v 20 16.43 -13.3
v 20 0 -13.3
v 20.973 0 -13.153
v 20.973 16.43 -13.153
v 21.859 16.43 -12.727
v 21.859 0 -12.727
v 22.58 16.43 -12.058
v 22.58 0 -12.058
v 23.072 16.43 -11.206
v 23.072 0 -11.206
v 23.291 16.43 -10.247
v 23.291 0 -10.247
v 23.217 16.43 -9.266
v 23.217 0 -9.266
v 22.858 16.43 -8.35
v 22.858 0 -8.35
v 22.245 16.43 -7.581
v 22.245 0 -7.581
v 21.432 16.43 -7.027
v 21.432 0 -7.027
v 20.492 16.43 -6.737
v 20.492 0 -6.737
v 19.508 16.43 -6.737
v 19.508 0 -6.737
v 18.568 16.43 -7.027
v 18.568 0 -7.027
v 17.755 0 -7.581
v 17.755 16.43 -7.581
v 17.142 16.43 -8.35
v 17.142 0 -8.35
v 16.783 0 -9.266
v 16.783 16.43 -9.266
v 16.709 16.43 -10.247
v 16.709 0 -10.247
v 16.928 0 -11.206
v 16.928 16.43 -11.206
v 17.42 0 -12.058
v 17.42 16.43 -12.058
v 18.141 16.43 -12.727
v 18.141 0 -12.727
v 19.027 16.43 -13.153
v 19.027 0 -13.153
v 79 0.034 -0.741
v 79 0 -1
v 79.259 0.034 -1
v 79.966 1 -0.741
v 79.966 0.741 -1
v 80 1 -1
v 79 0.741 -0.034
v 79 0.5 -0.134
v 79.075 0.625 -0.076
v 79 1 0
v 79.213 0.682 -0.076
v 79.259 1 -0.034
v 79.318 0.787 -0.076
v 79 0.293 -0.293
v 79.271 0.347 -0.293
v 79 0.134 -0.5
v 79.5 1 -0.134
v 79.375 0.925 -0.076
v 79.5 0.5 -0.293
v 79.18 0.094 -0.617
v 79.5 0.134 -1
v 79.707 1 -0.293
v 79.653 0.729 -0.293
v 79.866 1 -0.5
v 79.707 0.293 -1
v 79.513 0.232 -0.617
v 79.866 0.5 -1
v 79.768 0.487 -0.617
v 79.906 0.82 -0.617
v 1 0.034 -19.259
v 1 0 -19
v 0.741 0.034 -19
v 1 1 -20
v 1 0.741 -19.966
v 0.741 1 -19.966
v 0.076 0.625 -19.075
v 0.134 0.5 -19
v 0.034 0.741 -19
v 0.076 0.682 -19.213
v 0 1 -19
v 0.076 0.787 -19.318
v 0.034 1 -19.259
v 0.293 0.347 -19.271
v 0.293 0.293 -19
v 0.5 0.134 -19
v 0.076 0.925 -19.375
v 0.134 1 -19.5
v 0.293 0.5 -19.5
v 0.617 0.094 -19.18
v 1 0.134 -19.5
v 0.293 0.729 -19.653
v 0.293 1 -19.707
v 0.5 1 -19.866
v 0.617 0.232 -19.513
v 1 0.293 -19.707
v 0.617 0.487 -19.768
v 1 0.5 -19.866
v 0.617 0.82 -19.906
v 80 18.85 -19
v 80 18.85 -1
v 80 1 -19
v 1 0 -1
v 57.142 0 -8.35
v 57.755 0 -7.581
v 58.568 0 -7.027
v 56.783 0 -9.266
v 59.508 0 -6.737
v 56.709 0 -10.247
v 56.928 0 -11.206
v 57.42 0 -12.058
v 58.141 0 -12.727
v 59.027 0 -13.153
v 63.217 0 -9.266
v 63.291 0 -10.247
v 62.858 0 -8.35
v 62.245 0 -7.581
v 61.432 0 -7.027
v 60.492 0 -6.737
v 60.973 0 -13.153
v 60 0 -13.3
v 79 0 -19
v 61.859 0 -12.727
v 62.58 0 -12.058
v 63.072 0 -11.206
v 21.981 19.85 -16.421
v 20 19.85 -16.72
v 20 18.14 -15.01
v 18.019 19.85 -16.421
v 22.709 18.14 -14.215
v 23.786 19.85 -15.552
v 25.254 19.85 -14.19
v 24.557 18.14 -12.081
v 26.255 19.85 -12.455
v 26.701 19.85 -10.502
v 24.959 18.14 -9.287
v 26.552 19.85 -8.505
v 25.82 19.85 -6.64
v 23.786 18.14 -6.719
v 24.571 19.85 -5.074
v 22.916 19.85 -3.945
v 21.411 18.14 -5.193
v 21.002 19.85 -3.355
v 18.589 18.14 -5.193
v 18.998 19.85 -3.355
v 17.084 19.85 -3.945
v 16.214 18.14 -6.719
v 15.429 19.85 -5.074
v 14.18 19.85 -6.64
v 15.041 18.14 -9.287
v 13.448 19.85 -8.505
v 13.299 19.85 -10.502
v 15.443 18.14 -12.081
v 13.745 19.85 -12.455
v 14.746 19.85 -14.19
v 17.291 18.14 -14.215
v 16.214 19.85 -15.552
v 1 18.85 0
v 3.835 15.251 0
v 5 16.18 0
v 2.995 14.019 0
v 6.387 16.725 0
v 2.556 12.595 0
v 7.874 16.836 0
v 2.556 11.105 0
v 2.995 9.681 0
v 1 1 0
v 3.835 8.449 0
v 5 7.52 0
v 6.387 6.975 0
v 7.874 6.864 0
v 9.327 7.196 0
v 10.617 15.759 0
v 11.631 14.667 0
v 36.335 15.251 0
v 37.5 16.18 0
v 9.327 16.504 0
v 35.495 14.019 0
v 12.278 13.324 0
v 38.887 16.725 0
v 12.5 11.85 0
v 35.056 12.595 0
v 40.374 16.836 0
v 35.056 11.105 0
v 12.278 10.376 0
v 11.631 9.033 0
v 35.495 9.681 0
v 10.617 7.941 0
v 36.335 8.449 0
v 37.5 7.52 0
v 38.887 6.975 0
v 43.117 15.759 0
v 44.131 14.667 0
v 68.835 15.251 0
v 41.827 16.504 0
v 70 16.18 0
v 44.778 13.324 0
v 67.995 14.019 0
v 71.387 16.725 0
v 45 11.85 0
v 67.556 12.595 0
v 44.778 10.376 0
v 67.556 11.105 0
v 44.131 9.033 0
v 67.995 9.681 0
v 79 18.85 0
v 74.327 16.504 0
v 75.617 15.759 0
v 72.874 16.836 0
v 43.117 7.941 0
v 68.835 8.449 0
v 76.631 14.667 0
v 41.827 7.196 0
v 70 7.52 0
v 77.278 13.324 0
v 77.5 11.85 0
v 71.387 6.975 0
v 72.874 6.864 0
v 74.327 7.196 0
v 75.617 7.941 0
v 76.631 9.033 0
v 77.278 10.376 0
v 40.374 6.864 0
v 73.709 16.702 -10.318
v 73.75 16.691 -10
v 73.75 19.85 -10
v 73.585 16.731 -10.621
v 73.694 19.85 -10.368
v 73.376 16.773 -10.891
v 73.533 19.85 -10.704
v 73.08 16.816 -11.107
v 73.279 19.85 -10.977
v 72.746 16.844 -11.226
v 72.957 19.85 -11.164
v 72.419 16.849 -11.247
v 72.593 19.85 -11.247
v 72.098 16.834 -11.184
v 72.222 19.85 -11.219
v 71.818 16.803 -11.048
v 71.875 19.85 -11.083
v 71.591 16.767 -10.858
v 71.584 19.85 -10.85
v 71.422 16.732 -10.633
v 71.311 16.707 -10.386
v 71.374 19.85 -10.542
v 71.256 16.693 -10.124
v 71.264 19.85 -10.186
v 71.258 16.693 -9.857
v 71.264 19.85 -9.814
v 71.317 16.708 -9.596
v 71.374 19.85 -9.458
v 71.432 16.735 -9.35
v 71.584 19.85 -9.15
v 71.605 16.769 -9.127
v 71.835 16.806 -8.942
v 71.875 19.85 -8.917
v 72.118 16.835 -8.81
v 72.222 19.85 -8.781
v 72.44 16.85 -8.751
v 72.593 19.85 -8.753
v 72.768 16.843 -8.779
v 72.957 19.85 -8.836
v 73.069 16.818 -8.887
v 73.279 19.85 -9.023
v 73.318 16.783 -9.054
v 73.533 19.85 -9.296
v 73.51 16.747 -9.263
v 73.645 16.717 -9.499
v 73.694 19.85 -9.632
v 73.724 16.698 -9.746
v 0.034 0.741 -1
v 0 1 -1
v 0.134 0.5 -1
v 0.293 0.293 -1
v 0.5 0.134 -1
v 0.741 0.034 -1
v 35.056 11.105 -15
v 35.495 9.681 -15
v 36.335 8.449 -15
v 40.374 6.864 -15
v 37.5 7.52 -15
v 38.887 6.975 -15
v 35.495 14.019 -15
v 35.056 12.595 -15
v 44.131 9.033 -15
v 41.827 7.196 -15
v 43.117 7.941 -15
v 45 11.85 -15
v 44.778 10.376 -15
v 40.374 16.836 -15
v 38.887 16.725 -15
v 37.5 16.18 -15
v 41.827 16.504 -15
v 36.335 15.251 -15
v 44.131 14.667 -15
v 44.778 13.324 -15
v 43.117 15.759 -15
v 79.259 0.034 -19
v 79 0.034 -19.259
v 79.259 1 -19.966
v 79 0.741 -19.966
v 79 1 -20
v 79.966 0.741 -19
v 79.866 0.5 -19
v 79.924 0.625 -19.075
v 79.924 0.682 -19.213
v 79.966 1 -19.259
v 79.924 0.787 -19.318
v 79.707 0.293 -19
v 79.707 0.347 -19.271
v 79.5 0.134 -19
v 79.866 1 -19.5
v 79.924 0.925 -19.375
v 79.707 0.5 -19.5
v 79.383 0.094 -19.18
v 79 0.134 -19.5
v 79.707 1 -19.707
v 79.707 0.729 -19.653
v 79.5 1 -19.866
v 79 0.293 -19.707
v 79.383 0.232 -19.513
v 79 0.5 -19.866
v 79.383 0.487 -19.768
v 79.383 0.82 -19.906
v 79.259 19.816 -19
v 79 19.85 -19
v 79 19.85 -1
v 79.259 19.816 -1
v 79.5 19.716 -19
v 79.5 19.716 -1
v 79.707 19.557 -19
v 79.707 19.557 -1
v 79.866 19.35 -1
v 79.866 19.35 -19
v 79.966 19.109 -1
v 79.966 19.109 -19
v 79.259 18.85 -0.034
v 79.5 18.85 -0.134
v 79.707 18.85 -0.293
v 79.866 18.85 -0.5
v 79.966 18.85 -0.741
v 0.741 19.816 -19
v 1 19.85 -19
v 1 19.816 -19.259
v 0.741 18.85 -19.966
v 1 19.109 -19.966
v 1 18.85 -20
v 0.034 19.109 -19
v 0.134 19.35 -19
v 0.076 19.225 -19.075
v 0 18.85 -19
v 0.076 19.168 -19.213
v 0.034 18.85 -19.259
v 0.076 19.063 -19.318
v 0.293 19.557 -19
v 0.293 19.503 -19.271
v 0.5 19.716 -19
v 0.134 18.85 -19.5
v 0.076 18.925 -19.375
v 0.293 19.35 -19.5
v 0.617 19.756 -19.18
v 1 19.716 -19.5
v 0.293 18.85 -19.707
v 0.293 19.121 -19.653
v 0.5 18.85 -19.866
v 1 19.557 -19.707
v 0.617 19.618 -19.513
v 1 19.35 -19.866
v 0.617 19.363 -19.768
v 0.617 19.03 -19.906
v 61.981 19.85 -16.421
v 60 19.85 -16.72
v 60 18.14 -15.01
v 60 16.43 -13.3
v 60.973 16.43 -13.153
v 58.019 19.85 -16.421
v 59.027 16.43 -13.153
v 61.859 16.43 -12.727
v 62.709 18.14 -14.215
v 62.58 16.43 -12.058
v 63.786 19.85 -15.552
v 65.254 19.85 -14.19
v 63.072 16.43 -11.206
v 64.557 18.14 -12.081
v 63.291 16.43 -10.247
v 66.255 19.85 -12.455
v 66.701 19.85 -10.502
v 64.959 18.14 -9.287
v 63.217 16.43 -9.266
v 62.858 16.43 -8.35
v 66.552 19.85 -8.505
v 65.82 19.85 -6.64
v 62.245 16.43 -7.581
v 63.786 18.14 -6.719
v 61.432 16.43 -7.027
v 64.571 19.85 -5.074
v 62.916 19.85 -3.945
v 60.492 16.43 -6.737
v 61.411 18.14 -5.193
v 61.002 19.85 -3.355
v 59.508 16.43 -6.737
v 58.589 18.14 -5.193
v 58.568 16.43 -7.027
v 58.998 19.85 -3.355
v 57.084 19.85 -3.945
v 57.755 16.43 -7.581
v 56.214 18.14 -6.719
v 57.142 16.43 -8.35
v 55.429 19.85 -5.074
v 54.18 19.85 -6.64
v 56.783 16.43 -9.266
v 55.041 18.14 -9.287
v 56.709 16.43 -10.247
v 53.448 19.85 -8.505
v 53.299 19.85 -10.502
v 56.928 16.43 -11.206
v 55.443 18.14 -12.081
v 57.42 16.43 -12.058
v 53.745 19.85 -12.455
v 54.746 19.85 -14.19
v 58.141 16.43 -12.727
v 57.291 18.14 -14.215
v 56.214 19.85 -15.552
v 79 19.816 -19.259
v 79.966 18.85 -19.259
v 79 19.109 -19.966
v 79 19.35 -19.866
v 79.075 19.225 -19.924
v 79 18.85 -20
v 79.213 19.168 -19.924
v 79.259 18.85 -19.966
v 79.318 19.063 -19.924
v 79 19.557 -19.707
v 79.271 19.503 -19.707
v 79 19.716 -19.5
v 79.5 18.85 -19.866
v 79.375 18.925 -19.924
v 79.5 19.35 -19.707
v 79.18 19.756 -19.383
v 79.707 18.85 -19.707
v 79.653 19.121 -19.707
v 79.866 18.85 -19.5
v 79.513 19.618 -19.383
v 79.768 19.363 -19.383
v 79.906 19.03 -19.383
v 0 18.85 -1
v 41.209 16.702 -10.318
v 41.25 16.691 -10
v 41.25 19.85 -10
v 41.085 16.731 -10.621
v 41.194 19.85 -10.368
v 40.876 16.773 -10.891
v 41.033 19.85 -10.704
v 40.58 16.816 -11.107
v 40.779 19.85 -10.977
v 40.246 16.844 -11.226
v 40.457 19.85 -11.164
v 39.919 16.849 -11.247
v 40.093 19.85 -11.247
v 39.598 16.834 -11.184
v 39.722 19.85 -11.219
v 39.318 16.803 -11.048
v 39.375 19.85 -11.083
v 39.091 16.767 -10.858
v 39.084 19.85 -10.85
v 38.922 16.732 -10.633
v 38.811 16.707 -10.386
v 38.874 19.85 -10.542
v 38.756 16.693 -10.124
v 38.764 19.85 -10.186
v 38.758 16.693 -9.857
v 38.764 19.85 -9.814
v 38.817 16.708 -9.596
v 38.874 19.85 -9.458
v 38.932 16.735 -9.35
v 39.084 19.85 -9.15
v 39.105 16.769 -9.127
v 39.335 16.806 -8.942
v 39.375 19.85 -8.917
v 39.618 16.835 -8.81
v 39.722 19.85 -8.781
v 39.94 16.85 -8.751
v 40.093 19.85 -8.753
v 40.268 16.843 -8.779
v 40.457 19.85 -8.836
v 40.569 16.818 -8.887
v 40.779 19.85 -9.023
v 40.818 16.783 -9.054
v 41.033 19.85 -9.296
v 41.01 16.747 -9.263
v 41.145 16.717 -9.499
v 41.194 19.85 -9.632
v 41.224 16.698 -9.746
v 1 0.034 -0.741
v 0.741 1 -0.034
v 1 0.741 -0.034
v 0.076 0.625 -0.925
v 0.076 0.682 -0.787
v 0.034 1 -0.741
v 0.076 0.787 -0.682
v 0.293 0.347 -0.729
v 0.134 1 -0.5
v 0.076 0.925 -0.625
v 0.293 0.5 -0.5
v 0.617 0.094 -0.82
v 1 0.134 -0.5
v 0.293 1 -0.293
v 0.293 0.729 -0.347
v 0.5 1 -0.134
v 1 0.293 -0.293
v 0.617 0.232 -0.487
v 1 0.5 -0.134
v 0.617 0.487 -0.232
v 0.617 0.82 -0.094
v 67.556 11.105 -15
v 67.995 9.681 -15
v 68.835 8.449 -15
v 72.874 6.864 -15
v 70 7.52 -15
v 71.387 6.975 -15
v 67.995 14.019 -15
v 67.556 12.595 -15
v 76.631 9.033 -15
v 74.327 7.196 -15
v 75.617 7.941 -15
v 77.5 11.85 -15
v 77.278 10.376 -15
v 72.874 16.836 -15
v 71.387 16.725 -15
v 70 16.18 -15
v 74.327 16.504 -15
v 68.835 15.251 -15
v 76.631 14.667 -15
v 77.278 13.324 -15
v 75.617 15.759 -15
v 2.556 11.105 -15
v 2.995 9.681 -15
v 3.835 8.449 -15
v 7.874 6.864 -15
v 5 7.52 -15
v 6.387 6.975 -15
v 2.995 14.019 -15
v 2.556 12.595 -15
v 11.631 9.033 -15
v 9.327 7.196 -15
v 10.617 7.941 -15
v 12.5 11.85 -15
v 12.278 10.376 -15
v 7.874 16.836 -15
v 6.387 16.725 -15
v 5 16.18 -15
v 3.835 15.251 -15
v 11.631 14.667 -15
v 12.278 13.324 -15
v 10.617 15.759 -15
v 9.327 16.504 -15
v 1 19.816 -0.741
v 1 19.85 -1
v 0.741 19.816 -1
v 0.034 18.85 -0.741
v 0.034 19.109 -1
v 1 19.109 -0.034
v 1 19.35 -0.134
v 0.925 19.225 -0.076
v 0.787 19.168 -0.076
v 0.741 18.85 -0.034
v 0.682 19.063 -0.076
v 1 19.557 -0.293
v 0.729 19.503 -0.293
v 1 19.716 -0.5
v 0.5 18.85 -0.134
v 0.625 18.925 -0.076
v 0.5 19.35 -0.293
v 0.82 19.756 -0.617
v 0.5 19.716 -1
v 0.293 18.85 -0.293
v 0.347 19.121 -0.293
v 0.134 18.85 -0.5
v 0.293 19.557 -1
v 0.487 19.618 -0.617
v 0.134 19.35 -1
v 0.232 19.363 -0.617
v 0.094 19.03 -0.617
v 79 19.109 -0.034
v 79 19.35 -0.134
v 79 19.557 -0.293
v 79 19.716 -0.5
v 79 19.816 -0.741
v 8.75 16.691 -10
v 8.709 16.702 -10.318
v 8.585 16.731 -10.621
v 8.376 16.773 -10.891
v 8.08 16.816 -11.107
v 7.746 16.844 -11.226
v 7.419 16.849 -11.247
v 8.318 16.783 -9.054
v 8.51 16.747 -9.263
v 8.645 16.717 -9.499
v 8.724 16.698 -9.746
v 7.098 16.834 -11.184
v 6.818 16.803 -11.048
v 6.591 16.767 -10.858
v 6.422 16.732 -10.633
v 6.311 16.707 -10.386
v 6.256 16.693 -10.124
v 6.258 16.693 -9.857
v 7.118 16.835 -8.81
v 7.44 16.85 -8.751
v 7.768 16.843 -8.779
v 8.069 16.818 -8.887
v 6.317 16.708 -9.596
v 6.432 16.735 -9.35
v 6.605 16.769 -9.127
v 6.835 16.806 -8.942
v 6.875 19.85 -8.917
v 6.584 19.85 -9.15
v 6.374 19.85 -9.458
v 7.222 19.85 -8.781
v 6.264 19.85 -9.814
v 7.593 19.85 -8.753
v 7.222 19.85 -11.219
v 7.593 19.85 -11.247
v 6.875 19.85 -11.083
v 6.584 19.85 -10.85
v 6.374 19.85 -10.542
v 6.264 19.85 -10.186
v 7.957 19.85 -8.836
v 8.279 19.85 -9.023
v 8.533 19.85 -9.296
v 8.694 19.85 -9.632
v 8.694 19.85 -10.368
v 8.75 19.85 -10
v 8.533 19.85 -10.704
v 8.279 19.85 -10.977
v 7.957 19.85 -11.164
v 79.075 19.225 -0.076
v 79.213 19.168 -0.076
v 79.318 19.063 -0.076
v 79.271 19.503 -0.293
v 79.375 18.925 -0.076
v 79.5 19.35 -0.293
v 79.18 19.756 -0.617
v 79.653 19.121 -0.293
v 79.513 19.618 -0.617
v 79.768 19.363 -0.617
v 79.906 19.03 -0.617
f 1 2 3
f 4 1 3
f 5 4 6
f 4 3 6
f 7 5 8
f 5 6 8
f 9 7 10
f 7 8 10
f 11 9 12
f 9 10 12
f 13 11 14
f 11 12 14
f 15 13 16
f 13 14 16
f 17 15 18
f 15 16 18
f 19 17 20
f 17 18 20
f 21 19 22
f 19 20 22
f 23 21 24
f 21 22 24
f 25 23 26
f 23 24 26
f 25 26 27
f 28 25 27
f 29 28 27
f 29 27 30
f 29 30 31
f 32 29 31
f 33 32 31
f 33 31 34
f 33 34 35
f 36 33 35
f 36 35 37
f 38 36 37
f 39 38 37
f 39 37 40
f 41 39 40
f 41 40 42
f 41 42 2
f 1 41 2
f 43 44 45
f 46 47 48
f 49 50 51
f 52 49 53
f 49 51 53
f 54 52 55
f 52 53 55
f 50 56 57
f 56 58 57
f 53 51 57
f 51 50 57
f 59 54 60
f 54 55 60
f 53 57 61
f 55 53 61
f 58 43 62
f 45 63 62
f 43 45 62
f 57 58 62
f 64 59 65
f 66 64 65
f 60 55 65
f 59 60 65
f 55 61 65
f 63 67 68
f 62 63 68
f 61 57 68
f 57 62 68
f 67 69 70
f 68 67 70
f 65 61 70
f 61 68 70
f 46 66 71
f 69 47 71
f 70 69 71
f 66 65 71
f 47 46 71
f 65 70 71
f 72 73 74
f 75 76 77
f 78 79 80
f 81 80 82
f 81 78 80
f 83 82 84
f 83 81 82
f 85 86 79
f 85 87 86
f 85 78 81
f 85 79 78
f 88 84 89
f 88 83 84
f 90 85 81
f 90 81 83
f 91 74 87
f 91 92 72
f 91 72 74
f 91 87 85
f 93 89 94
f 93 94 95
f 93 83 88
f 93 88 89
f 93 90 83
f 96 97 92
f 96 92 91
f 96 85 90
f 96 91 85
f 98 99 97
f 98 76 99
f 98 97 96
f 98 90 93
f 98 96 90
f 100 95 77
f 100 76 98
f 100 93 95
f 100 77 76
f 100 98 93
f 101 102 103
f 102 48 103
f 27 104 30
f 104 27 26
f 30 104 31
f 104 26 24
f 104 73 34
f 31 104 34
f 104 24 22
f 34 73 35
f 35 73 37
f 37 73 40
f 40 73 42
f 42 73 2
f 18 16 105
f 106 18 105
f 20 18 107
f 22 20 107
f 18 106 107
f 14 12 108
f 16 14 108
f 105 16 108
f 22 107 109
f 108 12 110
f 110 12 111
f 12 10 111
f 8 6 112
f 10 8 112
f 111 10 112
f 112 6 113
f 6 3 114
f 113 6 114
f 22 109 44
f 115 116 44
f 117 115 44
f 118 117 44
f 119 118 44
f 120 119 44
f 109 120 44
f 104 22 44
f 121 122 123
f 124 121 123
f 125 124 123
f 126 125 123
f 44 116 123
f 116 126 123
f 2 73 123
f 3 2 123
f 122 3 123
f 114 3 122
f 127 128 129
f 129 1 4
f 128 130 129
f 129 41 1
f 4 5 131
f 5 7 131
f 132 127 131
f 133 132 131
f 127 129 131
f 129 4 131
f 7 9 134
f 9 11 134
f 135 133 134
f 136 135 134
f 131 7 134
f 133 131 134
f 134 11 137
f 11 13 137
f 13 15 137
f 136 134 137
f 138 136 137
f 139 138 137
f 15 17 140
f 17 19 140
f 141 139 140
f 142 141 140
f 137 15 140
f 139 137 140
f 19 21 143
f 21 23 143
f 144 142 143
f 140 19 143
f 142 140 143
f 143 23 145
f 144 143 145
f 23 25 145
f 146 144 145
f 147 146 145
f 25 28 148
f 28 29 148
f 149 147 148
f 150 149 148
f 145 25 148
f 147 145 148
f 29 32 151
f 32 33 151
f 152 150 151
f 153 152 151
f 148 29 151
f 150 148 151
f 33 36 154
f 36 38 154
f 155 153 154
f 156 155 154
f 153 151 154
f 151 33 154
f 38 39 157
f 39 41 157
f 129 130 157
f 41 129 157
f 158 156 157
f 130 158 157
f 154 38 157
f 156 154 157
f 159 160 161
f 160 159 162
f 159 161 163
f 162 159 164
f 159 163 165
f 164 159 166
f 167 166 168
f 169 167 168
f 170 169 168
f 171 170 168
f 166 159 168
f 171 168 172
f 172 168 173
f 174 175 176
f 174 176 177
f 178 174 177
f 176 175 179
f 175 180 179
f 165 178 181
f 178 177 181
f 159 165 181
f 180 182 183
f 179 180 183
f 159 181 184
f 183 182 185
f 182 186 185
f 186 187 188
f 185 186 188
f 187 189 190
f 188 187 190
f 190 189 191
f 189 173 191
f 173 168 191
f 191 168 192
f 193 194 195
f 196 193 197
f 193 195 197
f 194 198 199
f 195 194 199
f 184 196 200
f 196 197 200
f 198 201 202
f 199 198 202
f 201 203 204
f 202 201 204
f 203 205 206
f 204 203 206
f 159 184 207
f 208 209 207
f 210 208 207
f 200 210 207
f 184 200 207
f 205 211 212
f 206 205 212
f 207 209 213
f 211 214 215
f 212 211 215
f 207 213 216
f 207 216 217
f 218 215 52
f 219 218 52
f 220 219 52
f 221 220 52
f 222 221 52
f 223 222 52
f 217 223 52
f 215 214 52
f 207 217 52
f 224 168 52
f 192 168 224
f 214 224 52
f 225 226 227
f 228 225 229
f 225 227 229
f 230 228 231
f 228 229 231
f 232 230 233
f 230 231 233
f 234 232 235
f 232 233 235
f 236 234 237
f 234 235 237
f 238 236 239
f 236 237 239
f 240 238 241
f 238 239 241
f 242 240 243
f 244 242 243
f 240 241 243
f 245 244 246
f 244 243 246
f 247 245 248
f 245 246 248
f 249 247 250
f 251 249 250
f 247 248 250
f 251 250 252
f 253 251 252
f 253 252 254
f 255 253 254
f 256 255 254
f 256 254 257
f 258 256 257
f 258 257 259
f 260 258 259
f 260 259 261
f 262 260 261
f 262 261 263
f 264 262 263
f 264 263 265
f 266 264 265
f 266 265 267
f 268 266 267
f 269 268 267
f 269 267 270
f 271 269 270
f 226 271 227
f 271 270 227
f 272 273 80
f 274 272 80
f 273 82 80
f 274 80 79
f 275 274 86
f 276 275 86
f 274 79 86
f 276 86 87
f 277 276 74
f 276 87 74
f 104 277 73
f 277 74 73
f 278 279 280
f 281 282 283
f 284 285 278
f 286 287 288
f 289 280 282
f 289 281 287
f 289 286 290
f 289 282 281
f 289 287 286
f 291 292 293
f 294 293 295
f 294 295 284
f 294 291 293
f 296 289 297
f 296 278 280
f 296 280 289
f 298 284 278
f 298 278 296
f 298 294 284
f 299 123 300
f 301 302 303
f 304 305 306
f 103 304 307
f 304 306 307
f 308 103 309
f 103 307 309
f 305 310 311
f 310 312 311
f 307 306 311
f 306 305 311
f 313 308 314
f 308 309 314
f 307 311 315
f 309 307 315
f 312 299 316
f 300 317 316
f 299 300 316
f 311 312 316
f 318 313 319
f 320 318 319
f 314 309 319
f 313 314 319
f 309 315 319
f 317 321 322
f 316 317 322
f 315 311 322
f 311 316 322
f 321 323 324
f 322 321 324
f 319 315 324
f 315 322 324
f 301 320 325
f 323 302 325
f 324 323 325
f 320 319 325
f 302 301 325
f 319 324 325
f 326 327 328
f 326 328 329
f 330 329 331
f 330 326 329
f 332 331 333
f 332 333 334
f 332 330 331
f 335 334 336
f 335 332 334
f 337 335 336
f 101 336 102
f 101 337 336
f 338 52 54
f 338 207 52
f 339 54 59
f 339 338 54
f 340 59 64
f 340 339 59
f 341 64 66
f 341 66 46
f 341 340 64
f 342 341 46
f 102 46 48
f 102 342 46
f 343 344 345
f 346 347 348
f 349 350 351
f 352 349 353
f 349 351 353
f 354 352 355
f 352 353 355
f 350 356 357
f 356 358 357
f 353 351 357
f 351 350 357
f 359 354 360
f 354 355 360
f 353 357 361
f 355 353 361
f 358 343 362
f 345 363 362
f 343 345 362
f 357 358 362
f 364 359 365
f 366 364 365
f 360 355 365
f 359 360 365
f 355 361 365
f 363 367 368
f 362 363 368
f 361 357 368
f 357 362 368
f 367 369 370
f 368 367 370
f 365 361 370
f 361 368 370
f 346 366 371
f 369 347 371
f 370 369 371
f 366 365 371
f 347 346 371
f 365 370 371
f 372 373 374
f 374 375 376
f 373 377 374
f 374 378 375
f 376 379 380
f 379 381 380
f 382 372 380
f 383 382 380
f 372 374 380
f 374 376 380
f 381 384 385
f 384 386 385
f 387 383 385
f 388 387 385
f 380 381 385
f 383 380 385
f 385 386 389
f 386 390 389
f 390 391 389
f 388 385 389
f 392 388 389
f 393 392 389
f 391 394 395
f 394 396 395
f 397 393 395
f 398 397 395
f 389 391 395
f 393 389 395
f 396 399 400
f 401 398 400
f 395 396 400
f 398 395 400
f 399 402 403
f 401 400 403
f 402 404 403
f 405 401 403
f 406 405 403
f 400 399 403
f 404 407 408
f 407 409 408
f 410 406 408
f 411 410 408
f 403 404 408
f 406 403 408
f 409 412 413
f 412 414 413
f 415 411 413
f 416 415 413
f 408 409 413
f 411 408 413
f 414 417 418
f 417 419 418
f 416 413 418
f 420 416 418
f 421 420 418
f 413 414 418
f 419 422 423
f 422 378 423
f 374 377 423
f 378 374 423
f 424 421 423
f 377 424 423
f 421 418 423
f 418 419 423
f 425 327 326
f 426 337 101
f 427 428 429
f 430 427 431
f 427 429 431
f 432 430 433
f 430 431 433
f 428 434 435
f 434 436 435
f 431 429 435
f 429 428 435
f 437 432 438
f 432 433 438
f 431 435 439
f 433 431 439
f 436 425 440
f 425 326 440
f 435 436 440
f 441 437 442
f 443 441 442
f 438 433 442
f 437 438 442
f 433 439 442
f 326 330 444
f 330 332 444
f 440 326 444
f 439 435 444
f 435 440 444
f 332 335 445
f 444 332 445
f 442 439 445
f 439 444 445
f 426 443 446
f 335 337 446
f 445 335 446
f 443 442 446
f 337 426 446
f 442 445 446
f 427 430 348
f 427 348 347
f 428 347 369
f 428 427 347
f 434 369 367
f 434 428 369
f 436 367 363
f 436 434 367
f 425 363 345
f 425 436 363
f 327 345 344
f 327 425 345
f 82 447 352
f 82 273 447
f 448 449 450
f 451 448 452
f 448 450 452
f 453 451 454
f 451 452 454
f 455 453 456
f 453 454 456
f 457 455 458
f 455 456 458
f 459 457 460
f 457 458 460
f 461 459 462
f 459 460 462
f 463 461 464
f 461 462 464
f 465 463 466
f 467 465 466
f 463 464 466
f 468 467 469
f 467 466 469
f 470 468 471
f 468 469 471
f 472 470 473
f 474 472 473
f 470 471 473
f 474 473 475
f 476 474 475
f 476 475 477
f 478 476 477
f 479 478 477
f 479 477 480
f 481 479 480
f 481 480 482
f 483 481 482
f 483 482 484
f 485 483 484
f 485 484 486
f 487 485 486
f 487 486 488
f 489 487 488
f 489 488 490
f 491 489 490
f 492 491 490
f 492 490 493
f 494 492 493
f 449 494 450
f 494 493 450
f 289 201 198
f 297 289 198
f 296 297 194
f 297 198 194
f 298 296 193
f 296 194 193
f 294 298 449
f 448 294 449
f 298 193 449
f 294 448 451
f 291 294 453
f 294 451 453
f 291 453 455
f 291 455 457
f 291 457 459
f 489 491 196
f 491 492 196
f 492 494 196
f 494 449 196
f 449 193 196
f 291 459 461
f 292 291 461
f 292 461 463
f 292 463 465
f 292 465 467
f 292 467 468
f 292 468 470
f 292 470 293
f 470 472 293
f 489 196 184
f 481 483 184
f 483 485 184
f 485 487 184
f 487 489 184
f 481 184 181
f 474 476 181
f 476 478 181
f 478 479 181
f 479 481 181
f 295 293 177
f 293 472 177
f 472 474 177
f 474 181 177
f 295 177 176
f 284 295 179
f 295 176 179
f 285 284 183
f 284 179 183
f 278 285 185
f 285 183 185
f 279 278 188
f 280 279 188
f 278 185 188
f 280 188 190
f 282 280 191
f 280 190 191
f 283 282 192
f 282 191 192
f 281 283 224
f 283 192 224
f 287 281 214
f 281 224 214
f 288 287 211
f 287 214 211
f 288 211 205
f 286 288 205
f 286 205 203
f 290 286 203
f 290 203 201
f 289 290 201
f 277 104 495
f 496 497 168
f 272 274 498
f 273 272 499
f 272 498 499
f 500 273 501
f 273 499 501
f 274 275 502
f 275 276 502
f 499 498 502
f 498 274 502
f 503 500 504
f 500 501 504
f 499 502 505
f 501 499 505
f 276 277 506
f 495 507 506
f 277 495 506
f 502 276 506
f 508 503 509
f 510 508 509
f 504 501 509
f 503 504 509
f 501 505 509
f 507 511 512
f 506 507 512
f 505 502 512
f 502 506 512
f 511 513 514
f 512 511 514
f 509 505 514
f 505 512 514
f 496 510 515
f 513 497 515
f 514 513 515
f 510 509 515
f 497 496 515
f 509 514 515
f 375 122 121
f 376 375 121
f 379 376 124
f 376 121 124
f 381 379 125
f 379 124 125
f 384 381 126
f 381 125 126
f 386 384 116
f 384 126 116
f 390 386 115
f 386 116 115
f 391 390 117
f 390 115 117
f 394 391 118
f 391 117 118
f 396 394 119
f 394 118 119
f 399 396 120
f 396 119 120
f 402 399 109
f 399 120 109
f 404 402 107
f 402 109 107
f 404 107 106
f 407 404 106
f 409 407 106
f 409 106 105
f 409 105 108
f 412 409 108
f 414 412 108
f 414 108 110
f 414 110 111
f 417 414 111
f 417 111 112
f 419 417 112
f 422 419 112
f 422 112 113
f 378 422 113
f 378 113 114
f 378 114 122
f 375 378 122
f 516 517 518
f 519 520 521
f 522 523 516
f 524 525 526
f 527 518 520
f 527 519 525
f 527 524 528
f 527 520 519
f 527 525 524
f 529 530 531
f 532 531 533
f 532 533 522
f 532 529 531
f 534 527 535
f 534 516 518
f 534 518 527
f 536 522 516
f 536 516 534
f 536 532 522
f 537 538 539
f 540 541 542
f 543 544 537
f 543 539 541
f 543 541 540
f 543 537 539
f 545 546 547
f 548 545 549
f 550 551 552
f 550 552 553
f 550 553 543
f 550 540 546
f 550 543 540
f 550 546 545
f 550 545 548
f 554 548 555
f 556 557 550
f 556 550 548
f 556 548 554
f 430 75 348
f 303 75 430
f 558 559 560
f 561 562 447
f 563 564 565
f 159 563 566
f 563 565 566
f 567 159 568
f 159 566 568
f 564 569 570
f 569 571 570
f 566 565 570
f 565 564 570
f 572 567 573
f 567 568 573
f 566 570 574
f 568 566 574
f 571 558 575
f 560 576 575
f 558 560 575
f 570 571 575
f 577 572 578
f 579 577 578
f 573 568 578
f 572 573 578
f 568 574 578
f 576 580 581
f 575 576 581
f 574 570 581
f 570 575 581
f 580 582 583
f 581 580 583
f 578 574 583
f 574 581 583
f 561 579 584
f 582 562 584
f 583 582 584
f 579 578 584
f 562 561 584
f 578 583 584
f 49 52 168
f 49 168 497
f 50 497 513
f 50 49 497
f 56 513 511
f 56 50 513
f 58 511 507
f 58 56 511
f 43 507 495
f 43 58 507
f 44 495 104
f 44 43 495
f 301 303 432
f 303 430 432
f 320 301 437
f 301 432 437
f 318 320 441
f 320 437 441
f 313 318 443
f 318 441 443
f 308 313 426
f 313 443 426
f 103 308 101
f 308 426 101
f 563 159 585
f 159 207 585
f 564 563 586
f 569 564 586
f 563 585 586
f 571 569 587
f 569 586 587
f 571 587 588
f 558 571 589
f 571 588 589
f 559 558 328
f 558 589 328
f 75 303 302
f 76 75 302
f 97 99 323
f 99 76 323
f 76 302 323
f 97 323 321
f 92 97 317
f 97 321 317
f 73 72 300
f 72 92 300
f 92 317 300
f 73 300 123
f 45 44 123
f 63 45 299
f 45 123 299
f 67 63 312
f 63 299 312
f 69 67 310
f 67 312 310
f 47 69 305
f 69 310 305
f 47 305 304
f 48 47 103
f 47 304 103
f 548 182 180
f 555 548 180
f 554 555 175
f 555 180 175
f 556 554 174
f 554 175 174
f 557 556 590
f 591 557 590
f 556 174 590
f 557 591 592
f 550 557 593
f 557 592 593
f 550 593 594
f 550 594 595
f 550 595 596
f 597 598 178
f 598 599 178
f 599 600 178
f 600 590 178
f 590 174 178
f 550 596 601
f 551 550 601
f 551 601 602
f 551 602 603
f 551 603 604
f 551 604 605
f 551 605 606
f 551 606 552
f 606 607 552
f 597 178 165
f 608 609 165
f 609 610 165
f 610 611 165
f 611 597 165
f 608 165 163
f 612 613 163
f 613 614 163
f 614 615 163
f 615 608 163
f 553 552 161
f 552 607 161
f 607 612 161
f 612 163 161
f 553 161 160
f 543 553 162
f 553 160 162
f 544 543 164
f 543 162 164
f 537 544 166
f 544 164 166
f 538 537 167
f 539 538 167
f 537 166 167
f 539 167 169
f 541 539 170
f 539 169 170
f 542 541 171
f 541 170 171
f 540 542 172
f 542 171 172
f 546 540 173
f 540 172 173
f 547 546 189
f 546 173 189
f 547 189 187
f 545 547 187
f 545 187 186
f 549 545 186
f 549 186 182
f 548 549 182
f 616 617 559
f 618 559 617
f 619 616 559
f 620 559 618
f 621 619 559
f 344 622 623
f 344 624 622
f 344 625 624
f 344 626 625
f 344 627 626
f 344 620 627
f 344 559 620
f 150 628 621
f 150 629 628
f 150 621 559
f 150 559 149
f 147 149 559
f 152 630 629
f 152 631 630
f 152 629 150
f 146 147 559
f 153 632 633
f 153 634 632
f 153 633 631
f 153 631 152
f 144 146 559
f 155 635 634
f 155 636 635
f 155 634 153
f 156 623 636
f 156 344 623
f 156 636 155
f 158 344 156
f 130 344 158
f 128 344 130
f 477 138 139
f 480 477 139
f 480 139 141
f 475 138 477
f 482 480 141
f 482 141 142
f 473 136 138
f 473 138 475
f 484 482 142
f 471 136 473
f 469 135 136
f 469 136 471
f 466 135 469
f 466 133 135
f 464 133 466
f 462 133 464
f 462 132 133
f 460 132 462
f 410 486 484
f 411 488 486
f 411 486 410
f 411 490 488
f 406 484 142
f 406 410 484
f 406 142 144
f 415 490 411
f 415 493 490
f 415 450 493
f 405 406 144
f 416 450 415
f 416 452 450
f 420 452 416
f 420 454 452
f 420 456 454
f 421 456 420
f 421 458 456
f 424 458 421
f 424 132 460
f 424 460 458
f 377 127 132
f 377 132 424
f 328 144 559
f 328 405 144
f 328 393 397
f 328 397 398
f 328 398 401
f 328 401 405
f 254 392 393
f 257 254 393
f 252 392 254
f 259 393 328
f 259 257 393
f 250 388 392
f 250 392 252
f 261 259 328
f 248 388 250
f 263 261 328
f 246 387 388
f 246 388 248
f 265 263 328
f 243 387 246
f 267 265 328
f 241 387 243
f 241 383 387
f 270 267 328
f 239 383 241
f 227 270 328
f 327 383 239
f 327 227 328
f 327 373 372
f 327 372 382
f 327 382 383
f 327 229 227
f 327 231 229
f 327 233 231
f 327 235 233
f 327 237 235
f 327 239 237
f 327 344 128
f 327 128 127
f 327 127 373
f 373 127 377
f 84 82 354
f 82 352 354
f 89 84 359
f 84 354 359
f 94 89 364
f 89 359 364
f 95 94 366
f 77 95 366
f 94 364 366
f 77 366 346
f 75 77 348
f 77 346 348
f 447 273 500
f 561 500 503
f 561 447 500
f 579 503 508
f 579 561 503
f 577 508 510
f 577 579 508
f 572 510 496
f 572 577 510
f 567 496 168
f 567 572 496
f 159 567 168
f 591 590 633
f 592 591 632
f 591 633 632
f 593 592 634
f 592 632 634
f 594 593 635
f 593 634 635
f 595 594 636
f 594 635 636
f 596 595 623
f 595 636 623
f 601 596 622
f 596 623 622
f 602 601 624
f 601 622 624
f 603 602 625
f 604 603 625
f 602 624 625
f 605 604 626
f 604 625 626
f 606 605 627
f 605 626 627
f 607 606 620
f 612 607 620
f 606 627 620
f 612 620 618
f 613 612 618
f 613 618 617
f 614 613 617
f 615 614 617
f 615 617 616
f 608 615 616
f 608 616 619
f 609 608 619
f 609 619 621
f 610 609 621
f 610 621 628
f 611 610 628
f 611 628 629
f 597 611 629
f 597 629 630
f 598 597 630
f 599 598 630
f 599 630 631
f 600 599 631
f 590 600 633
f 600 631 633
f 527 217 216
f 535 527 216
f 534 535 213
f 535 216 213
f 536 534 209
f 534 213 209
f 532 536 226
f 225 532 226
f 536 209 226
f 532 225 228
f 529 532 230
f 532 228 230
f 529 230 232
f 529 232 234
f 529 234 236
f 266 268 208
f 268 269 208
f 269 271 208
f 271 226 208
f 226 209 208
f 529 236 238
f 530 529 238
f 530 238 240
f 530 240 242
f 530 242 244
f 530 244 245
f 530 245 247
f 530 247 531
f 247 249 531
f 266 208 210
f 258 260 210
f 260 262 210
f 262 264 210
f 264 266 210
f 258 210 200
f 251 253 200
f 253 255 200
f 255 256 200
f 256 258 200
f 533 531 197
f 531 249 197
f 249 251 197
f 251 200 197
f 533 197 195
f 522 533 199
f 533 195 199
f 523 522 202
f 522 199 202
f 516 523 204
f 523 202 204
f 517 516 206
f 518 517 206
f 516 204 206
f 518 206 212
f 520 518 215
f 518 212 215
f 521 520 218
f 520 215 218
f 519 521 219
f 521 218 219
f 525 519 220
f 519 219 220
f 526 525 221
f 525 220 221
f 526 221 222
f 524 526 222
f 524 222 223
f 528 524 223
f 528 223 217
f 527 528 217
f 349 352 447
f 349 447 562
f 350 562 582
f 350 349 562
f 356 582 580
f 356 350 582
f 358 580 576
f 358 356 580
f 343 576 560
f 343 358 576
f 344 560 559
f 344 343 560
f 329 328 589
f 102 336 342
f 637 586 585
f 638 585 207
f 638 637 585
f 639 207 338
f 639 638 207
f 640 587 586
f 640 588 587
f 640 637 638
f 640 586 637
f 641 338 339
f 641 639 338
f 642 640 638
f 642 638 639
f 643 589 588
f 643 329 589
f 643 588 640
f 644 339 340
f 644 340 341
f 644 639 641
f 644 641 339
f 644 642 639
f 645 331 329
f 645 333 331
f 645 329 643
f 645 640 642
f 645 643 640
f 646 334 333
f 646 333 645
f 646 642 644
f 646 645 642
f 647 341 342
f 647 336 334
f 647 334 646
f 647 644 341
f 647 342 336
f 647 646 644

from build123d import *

# Parameters (mm, degrees)
SKETCH1_W                     = 80
SKETCH1_H                     = 20
BOSS_EXTRUDE1_DEPTH           = 19.85
CUT_EXTRUDE1_REACH            = 86.818
SKETCH2_R                     = 3.1
SKETCH3_R                     = 5
CUT_EXTRUDE2_DEPTH            = 15
FILLET1_R                     = 1
CSK_FOR_M6_SFHCS1_D           = 6.6
CSK_FOR_M6_SFHCS1_DEPTH       = 19.85
CSK_FOR_M6_SFHCS1_CSINK_D     = 13.44
CSK_FOR_M6_SFHCS1_CSINK_ANGLE = 90
M3X0_5_TAPPED_HOLE1_REACH     = 86.818
M3X0_5_TAPPED_HOLE1_BORE_R    = 1.25


with BuildPart() as part:
    # Sketch1 → Boss-Extrude1 (new body)
    with BuildSketch(Plane(origin=(0, 0, 0), x_dir=(1, 0, 0), z_dir=(0, 1, 0))):
        with Locations((40, 10)):
            Rectangle(SKETCH1_W, SKETCH1_H)
    extrude(amount=BOSS_EXTRUDE1_DEPTH)

    # Sketch2 → Cut-Extrude1 (cut, up to next)
    with BuildSketch(Plane(origin=(0, 19.85, 0), x_dir=(1, 0, 0), z_dir=(0, 1, 0)), mode=Mode.PRIVATE) as cut_extrude1_sk1:
        with Locations(Location((20, 10, 0), (0, 0, 270))):
            Circle(SKETCH2_R)
    cut_extrude1_tool1 = extrude(cut_extrude1_sk1.sketch, amount=-CUT_EXTRUDE1_REACH, mode=Mode.PRIVATE) & part.part
    # Sketch2 → Cut-Extrude1 (cut, up to next)
    with BuildSketch(Plane(origin=(0, 19.85, 0), x_dir=(1, 0, 0), z_dir=(0, 1, 0)), mode=Mode.PRIVATE) as cut_extrude1_sk2:
        with Locations(Location((60, 10, 0), (0, 0, 270))):
            Circle(SKETCH2_R)
    cut_extrude1_tool2 = extrude(cut_extrude1_sk2.sketch, amount=-CUT_EXTRUDE1_REACH, mode=Mode.PRIVATE) & part.part
    add(cut_extrude1_tool1.solids().sort_by_distance((20, 19.85, -10))[0], mode=Mode.SUBTRACT)
    add(cut_extrude1_tool2.solids().sort_by_distance((60, 19.85, -10))[0], mode=Mode.SUBTRACT)

    # Sketch3 → Cut-Extrude2 (cut)
    with BuildSketch(Plane.XY):
        with Locations((7.5, 11.85)):
            Circle(SKETCH3_R)
        with Locations((72.5, 11.85)):
            Circle(SKETCH3_R)
        with Locations((40, 11.85)):
            Circle(SKETCH3_R)
    extrude(amount=-CUT_EXTRUDE2_DEPTH, mode=Mode.SUBTRACT)

    # Fillet1
    fillet1_edges = [part.edges().sort_by_distance(p)[0] for p in [
        (80, 19.85, -10),
        (40, 19.85, -20),
        (0, 19.85, -10),
        (40, 0, -20),
        (80, 0, -10),
        (40, 0, 0),
        (0, 0, -10),
        (40, 19.85, 0),
        (0, 9.925, -20),
        (80, 9.925, -20),
        (80, 9.925, 0),
        (0, 9.925, 0),
    ]]
    fillet(fillet1_edges, radius=FILLET1_R)

    # CSK for M6 SFHCS1
    with Locations(Plane(origin=(20, 19.85, -10), x_dir=(0, 0, 1), z_dir=(0, 1, 0))):
        with Locations((0, 0), (0, 40)):
            CounterSinkHole(CSK_FOR_M6_SFHCS1_D / 2, CSK_FOR_M6_SFHCS1_CSINK_D / 2, depth=CSK_FOR_M6_SFHCS1_DEPTH, counter_sink_angle=CSK_FOR_M6_SFHCS1_CSINK_ANGLE)

    # M3x0.5 Tapped Hole1 bore → M3x0.5 Tapped Hole1 (cut, up to next)
    with BuildSketch(Plane(origin=(0, 19.85, 0), x_dir=(1, 0, 0), z_dir=(0, 1, 0)), mode=Mode.PRIVATE) as m3x0_5_tapped_hole1_sk1:
        with Locations((7.5, 10)):
            Circle(M3X0_5_TAPPED_HOLE1_BORE_R)
    m3x0_5_tapped_hole1_tool1 = extrude(m3x0_5_tapped_hole1_sk1.sketch, amount=-M3X0_5_TAPPED_HOLE1_REACH, mode=Mode.PRIVATE) & part.part
    # M3x0.5 Tapped Hole1 bore → M3x0.5 Tapped Hole1 (cut, up to next)
    with BuildSketch(Plane(origin=(0, 19.85, 0), x_dir=(1, 0, 0), z_dir=(0, 1, 0)), mode=Mode.PRIVATE) as m3x0_5_tapped_hole1_sk2:
        with Locations((40, 10)):
            Circle(M3X0_5_TAPPED_HOLE1_BORE_R)
    m3x0_5_tapped_hole1_tool2 = extrude(m3x0_5_tapped_hole1_sk2.sketch, amount=-M3X0_5_TAPPED_HOLE1_REACH, mode=Mode.PRIVATE) & part.part
    # M3x0.5 Tapped Hole1 bore → M3x0.5 Tapped Hole1 (cut, up to next)
    with BuildSketch(Plane(origin=(0, 19.85, 0), x_dir=(1, 0, 0), z_dir=(0, 1, 0)), mode=Mode.PRIVATE) as m3x0_5_tapped_hole1_sk3:
        with Locations((72.5, 10)):
            Circle(M3X0_5_TAPPED_HOLE1_BORE_R)
    m3x0_5_tapped_hole1_tool3 = extrude(m3x0_5_tapped_hole1_sk3.sketch, amount=-M3X0_5_TAPPED_HOLE1_REACH, mode=Mode.PRIVATE) & part.part
    add(m3x0_5_tapped_hole1_tool1.solids().sort_by_distance((7.5, 19.85, -10))[0], mode=Mode.SUBTRACT)
    add(m3x0_5_tapped_hole1_tool2.solids().sort_by_distance((40, 19.85, -10))[0], mode=Mode.SUBTRACT)
    add(m3x0_5_tapped_hole1_tool3.solids().sort_by_distance((72.5, 19.85, -10))[0], mode=Mode.SUBTRACT)


solid = part.part
